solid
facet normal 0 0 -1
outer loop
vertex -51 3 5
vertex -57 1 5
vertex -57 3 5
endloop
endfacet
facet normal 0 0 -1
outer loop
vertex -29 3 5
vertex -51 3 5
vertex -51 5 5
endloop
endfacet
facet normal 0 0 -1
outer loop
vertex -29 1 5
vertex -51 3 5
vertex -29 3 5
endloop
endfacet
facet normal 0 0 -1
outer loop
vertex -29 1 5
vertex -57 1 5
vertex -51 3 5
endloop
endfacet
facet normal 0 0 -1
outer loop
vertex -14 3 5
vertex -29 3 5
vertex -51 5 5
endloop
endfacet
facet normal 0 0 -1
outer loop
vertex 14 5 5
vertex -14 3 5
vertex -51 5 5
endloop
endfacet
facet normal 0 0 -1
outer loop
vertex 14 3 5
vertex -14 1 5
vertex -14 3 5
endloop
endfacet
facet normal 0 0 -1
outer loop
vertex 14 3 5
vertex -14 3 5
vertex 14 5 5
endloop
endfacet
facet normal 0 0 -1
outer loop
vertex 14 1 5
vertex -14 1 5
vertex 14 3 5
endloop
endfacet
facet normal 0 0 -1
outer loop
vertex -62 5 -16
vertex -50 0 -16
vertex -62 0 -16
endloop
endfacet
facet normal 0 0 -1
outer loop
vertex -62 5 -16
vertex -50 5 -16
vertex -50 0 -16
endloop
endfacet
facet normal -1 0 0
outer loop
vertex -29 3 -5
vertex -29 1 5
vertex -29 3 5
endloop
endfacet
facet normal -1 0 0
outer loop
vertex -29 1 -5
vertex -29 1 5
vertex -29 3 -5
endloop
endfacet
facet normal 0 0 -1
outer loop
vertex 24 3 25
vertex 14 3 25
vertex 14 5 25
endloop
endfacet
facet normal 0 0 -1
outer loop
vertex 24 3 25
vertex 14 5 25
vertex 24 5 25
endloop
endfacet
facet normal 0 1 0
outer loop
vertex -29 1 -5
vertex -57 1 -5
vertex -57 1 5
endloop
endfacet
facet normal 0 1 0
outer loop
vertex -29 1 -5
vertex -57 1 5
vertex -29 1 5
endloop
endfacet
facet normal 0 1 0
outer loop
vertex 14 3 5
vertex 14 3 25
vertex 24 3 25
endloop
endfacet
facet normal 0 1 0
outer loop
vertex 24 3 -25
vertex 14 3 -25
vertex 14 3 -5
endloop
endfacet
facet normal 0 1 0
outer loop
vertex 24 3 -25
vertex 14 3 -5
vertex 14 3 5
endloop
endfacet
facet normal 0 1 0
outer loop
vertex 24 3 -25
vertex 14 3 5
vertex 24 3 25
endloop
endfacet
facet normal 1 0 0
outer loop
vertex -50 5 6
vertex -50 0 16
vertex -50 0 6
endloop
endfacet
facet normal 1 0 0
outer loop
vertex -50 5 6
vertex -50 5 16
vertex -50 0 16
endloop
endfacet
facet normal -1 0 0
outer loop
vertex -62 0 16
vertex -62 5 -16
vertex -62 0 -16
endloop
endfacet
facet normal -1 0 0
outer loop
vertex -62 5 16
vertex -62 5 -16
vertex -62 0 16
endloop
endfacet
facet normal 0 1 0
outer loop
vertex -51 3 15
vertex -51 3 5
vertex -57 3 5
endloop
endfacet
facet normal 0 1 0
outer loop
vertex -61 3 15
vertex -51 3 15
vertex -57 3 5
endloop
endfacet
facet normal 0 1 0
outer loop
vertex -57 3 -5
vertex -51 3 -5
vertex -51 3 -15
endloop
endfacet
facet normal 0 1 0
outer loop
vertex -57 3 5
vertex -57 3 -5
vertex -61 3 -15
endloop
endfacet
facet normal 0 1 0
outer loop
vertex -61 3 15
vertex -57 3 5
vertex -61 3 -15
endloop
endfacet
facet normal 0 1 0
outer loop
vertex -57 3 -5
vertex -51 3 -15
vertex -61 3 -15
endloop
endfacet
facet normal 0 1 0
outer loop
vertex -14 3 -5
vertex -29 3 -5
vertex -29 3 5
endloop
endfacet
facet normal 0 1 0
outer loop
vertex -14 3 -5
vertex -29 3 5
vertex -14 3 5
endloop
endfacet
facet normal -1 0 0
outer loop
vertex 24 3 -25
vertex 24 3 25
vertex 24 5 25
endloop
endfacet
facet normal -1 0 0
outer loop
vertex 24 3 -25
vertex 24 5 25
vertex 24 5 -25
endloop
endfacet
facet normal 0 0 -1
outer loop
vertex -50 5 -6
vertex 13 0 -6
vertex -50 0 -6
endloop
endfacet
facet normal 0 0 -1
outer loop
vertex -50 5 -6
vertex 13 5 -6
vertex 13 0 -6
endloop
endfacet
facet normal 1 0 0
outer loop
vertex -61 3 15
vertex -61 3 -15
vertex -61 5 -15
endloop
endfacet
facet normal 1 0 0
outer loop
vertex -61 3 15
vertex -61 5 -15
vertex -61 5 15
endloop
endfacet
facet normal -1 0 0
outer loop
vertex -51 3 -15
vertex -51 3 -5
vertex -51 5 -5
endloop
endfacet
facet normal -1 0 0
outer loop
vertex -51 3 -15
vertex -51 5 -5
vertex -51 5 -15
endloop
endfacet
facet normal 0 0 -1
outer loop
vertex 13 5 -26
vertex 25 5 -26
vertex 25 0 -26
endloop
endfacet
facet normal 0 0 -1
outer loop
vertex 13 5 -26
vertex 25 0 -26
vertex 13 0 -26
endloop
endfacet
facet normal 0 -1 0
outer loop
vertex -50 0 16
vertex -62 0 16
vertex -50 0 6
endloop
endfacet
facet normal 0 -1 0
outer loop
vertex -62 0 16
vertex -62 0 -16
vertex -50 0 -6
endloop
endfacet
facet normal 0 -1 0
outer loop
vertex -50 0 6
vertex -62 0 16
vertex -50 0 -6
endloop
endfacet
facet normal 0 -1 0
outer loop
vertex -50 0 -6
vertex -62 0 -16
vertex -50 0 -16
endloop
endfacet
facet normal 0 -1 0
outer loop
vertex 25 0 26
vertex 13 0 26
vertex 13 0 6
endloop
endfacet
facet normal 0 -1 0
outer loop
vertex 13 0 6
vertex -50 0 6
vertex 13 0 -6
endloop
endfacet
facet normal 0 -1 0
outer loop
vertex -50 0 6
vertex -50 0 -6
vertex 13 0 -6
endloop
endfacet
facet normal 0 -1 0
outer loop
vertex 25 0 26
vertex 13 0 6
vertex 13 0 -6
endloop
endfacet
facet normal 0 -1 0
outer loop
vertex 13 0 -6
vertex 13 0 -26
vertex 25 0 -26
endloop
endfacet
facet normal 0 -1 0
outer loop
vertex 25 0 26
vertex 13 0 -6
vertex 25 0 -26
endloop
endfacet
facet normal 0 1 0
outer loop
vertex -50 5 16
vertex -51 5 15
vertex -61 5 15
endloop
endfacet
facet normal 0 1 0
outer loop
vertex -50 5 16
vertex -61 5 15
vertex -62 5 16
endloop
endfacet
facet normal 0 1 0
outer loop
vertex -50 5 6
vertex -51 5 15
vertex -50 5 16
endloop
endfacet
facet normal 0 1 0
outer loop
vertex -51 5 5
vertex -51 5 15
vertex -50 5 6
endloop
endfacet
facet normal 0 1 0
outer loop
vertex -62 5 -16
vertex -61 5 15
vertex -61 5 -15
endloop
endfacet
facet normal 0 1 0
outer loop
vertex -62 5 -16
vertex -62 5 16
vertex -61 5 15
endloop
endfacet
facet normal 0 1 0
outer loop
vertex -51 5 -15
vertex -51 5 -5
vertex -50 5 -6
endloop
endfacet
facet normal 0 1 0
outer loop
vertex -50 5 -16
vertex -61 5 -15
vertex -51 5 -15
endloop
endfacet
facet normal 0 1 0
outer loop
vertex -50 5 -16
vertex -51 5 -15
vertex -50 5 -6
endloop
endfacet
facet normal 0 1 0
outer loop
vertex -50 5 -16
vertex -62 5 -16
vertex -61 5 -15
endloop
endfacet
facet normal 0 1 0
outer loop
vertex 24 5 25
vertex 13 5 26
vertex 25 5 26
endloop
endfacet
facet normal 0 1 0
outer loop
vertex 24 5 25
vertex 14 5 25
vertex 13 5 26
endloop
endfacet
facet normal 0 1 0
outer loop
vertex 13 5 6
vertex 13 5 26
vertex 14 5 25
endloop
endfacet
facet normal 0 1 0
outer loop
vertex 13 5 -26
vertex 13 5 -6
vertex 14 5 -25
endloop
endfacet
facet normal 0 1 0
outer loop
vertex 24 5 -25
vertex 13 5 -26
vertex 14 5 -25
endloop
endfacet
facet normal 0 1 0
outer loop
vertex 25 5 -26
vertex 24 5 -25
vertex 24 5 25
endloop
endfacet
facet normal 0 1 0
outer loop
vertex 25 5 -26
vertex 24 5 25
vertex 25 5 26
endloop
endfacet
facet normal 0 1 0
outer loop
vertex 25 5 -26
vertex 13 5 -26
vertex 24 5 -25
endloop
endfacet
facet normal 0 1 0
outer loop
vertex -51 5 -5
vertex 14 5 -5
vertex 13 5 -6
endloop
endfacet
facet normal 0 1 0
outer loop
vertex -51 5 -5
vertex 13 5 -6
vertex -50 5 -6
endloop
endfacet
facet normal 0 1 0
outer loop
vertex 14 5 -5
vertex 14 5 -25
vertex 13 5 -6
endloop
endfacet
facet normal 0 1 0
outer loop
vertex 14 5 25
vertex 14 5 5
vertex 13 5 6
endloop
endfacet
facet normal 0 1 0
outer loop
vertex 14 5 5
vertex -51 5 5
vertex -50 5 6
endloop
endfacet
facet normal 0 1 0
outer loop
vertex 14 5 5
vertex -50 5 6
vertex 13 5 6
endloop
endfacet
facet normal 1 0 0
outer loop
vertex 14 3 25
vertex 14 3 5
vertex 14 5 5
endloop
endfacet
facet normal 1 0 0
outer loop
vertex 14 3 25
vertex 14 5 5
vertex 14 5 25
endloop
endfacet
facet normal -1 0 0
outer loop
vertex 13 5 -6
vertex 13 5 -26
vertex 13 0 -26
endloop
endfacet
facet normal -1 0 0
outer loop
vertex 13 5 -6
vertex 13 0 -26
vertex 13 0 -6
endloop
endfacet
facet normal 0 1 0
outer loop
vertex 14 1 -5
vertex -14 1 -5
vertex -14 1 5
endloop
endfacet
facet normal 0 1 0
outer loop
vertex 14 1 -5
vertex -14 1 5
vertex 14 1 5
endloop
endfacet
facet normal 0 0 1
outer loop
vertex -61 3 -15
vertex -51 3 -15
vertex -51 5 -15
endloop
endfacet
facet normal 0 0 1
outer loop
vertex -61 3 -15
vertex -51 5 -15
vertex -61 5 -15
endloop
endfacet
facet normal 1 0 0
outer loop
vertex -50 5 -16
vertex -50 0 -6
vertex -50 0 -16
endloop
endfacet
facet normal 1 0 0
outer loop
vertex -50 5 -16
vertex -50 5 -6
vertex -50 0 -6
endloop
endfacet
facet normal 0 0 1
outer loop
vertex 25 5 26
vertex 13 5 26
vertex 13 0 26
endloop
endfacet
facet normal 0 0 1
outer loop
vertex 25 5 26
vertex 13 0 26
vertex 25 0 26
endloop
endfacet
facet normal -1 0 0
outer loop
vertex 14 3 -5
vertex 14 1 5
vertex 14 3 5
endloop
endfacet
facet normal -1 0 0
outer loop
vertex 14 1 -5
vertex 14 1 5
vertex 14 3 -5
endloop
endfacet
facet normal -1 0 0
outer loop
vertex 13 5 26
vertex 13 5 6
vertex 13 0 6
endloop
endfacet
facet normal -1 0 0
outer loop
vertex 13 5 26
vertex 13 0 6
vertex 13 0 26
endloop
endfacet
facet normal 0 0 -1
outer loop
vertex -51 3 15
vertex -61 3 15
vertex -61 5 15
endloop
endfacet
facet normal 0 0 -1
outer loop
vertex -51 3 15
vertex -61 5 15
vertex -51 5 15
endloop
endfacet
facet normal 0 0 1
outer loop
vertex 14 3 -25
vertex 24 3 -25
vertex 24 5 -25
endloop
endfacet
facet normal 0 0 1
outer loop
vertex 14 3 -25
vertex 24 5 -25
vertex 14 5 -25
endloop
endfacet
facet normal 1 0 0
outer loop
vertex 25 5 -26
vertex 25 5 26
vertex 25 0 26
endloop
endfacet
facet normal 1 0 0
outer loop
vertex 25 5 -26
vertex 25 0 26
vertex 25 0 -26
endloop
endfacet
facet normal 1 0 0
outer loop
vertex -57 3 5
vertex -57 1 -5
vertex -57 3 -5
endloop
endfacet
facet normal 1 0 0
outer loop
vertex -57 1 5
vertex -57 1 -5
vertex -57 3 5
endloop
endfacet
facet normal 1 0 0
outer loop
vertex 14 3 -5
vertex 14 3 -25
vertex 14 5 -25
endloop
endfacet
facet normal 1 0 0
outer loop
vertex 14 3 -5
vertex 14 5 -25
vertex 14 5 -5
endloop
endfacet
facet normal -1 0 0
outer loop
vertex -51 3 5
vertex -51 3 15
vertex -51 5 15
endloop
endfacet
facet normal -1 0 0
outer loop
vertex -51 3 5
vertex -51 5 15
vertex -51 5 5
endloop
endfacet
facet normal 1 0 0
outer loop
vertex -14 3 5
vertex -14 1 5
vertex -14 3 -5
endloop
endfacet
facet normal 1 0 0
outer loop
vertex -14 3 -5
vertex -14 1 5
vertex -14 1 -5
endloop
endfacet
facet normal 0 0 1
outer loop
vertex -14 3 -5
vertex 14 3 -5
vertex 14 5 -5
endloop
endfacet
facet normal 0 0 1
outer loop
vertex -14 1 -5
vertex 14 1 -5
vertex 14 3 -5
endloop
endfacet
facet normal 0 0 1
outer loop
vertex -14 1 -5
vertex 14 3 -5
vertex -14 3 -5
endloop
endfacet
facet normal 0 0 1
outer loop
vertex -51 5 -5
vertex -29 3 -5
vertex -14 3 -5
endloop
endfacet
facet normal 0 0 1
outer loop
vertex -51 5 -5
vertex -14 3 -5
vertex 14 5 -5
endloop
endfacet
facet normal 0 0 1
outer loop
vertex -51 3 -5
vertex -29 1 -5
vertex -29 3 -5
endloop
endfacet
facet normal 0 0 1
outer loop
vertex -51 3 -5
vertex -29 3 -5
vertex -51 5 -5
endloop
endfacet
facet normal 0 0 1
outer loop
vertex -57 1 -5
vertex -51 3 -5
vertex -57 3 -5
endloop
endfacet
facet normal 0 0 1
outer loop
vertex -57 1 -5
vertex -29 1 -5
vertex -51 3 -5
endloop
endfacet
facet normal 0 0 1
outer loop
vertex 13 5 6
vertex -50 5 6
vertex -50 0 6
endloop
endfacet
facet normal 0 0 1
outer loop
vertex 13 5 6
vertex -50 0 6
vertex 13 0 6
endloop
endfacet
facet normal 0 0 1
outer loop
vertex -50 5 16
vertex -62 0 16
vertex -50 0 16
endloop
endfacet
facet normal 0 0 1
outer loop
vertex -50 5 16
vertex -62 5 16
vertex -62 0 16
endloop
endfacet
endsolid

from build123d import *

# Parameters (mm, degrees)
SKETCH_2_W           = 65
SKETCH_2_H           = 10
SKETCH_2_W_2         = 6
EXTRUDE_1_DEPTH      = 1
EXTRUDE_2_DEPTH      = 4
EXTRUDE_2_DEPTH_BACK = 1
SKETCH_5_W           = 15
SKETCH_5_H           = 10
SKETCH_5_W_2         = 10
SKETCH_5_H_2         = 50
EXTRUDE_3_DEPTH      = 2


with BuildPart() as part:
    # 草图2 → 凸台-拉伸1 (new body)
    with BuildSketch(Plane(origin=(0, 0, 0), x_dir=(1, 0, 0), z_dir=(0, 1, 0))):
        with Locations((-18.5, 0)):
            Rectangle(SKETCH_2_W, SKETCH_2_H)
        with Locations((-54, 0)):
            Rectangle(SKETCH_2_W_2, SKETCH_2_H)
        Polygon((-51, 15), (-61, 15), (-61, -15), (-51, -15), (-51, -5), (-57, -5), (-57, 5), (-51, 5), align=None)
        Polygon((14, 25), (14, 5), (14, -5), (14, -25), (24, -25), (24, 25), align=None)
    extrude(amount=EXTRUDE_1_DEPTH)

    # 草图4 → 凸台-拉伸2 (add, two sides)
    with BuildSketch(Plane(origin=(0, 1, 0), x_dir=(1, 0, 0), z_dir=(0, 1, 0))) as extrude_2_sk:
        Polygon((-50, -16), (-50, -6), (13, -6), (13, -26), (25, -26), (25, 26), (13, 26), (13, 6), (-50, 6), (-50, 16), (-62, 16), (-62, -16), align=None)
        Polygon((-51, -15), (-51, -5), (14, -5), (14, -25), (24, -25), (24, 25), (14, 25), (14, 5), (-51, 5), (-51, 15), (-61, 15), (-61, -15), align=None, mode=Mode.SUBTRACT)
    extrude(amount=EXTRUDE_2_DEPTH)
    extrude(extrude_2_sk.sketch, amount=-EXTRUDE_2_DEPTH_BACK)

    # 草图5 → 凸台-拉伸3 (add)
    with BuildSketch(Plane(origin=(0, 1, 0), x_dir=(1, 0, 0), z_dir=(0, 1, 0))):
        Polygon((-57, 5), (-57, -5), (-51, -5), (-51, -15), (-61, -15), (-61, 15), (-51, 15), (-51, 5), align=None)
        with Locations((-21.5, 0)):
            Rectangle(SKETCH_5_W, SKETCH_5_H)
        with Locations((19, 0)):
            Rectangle(SKETCH_5_W_2, SKETCH_5_H_2)
    extrude(amount=EXTRUDE_3_DEPTH)


solid = part.part
